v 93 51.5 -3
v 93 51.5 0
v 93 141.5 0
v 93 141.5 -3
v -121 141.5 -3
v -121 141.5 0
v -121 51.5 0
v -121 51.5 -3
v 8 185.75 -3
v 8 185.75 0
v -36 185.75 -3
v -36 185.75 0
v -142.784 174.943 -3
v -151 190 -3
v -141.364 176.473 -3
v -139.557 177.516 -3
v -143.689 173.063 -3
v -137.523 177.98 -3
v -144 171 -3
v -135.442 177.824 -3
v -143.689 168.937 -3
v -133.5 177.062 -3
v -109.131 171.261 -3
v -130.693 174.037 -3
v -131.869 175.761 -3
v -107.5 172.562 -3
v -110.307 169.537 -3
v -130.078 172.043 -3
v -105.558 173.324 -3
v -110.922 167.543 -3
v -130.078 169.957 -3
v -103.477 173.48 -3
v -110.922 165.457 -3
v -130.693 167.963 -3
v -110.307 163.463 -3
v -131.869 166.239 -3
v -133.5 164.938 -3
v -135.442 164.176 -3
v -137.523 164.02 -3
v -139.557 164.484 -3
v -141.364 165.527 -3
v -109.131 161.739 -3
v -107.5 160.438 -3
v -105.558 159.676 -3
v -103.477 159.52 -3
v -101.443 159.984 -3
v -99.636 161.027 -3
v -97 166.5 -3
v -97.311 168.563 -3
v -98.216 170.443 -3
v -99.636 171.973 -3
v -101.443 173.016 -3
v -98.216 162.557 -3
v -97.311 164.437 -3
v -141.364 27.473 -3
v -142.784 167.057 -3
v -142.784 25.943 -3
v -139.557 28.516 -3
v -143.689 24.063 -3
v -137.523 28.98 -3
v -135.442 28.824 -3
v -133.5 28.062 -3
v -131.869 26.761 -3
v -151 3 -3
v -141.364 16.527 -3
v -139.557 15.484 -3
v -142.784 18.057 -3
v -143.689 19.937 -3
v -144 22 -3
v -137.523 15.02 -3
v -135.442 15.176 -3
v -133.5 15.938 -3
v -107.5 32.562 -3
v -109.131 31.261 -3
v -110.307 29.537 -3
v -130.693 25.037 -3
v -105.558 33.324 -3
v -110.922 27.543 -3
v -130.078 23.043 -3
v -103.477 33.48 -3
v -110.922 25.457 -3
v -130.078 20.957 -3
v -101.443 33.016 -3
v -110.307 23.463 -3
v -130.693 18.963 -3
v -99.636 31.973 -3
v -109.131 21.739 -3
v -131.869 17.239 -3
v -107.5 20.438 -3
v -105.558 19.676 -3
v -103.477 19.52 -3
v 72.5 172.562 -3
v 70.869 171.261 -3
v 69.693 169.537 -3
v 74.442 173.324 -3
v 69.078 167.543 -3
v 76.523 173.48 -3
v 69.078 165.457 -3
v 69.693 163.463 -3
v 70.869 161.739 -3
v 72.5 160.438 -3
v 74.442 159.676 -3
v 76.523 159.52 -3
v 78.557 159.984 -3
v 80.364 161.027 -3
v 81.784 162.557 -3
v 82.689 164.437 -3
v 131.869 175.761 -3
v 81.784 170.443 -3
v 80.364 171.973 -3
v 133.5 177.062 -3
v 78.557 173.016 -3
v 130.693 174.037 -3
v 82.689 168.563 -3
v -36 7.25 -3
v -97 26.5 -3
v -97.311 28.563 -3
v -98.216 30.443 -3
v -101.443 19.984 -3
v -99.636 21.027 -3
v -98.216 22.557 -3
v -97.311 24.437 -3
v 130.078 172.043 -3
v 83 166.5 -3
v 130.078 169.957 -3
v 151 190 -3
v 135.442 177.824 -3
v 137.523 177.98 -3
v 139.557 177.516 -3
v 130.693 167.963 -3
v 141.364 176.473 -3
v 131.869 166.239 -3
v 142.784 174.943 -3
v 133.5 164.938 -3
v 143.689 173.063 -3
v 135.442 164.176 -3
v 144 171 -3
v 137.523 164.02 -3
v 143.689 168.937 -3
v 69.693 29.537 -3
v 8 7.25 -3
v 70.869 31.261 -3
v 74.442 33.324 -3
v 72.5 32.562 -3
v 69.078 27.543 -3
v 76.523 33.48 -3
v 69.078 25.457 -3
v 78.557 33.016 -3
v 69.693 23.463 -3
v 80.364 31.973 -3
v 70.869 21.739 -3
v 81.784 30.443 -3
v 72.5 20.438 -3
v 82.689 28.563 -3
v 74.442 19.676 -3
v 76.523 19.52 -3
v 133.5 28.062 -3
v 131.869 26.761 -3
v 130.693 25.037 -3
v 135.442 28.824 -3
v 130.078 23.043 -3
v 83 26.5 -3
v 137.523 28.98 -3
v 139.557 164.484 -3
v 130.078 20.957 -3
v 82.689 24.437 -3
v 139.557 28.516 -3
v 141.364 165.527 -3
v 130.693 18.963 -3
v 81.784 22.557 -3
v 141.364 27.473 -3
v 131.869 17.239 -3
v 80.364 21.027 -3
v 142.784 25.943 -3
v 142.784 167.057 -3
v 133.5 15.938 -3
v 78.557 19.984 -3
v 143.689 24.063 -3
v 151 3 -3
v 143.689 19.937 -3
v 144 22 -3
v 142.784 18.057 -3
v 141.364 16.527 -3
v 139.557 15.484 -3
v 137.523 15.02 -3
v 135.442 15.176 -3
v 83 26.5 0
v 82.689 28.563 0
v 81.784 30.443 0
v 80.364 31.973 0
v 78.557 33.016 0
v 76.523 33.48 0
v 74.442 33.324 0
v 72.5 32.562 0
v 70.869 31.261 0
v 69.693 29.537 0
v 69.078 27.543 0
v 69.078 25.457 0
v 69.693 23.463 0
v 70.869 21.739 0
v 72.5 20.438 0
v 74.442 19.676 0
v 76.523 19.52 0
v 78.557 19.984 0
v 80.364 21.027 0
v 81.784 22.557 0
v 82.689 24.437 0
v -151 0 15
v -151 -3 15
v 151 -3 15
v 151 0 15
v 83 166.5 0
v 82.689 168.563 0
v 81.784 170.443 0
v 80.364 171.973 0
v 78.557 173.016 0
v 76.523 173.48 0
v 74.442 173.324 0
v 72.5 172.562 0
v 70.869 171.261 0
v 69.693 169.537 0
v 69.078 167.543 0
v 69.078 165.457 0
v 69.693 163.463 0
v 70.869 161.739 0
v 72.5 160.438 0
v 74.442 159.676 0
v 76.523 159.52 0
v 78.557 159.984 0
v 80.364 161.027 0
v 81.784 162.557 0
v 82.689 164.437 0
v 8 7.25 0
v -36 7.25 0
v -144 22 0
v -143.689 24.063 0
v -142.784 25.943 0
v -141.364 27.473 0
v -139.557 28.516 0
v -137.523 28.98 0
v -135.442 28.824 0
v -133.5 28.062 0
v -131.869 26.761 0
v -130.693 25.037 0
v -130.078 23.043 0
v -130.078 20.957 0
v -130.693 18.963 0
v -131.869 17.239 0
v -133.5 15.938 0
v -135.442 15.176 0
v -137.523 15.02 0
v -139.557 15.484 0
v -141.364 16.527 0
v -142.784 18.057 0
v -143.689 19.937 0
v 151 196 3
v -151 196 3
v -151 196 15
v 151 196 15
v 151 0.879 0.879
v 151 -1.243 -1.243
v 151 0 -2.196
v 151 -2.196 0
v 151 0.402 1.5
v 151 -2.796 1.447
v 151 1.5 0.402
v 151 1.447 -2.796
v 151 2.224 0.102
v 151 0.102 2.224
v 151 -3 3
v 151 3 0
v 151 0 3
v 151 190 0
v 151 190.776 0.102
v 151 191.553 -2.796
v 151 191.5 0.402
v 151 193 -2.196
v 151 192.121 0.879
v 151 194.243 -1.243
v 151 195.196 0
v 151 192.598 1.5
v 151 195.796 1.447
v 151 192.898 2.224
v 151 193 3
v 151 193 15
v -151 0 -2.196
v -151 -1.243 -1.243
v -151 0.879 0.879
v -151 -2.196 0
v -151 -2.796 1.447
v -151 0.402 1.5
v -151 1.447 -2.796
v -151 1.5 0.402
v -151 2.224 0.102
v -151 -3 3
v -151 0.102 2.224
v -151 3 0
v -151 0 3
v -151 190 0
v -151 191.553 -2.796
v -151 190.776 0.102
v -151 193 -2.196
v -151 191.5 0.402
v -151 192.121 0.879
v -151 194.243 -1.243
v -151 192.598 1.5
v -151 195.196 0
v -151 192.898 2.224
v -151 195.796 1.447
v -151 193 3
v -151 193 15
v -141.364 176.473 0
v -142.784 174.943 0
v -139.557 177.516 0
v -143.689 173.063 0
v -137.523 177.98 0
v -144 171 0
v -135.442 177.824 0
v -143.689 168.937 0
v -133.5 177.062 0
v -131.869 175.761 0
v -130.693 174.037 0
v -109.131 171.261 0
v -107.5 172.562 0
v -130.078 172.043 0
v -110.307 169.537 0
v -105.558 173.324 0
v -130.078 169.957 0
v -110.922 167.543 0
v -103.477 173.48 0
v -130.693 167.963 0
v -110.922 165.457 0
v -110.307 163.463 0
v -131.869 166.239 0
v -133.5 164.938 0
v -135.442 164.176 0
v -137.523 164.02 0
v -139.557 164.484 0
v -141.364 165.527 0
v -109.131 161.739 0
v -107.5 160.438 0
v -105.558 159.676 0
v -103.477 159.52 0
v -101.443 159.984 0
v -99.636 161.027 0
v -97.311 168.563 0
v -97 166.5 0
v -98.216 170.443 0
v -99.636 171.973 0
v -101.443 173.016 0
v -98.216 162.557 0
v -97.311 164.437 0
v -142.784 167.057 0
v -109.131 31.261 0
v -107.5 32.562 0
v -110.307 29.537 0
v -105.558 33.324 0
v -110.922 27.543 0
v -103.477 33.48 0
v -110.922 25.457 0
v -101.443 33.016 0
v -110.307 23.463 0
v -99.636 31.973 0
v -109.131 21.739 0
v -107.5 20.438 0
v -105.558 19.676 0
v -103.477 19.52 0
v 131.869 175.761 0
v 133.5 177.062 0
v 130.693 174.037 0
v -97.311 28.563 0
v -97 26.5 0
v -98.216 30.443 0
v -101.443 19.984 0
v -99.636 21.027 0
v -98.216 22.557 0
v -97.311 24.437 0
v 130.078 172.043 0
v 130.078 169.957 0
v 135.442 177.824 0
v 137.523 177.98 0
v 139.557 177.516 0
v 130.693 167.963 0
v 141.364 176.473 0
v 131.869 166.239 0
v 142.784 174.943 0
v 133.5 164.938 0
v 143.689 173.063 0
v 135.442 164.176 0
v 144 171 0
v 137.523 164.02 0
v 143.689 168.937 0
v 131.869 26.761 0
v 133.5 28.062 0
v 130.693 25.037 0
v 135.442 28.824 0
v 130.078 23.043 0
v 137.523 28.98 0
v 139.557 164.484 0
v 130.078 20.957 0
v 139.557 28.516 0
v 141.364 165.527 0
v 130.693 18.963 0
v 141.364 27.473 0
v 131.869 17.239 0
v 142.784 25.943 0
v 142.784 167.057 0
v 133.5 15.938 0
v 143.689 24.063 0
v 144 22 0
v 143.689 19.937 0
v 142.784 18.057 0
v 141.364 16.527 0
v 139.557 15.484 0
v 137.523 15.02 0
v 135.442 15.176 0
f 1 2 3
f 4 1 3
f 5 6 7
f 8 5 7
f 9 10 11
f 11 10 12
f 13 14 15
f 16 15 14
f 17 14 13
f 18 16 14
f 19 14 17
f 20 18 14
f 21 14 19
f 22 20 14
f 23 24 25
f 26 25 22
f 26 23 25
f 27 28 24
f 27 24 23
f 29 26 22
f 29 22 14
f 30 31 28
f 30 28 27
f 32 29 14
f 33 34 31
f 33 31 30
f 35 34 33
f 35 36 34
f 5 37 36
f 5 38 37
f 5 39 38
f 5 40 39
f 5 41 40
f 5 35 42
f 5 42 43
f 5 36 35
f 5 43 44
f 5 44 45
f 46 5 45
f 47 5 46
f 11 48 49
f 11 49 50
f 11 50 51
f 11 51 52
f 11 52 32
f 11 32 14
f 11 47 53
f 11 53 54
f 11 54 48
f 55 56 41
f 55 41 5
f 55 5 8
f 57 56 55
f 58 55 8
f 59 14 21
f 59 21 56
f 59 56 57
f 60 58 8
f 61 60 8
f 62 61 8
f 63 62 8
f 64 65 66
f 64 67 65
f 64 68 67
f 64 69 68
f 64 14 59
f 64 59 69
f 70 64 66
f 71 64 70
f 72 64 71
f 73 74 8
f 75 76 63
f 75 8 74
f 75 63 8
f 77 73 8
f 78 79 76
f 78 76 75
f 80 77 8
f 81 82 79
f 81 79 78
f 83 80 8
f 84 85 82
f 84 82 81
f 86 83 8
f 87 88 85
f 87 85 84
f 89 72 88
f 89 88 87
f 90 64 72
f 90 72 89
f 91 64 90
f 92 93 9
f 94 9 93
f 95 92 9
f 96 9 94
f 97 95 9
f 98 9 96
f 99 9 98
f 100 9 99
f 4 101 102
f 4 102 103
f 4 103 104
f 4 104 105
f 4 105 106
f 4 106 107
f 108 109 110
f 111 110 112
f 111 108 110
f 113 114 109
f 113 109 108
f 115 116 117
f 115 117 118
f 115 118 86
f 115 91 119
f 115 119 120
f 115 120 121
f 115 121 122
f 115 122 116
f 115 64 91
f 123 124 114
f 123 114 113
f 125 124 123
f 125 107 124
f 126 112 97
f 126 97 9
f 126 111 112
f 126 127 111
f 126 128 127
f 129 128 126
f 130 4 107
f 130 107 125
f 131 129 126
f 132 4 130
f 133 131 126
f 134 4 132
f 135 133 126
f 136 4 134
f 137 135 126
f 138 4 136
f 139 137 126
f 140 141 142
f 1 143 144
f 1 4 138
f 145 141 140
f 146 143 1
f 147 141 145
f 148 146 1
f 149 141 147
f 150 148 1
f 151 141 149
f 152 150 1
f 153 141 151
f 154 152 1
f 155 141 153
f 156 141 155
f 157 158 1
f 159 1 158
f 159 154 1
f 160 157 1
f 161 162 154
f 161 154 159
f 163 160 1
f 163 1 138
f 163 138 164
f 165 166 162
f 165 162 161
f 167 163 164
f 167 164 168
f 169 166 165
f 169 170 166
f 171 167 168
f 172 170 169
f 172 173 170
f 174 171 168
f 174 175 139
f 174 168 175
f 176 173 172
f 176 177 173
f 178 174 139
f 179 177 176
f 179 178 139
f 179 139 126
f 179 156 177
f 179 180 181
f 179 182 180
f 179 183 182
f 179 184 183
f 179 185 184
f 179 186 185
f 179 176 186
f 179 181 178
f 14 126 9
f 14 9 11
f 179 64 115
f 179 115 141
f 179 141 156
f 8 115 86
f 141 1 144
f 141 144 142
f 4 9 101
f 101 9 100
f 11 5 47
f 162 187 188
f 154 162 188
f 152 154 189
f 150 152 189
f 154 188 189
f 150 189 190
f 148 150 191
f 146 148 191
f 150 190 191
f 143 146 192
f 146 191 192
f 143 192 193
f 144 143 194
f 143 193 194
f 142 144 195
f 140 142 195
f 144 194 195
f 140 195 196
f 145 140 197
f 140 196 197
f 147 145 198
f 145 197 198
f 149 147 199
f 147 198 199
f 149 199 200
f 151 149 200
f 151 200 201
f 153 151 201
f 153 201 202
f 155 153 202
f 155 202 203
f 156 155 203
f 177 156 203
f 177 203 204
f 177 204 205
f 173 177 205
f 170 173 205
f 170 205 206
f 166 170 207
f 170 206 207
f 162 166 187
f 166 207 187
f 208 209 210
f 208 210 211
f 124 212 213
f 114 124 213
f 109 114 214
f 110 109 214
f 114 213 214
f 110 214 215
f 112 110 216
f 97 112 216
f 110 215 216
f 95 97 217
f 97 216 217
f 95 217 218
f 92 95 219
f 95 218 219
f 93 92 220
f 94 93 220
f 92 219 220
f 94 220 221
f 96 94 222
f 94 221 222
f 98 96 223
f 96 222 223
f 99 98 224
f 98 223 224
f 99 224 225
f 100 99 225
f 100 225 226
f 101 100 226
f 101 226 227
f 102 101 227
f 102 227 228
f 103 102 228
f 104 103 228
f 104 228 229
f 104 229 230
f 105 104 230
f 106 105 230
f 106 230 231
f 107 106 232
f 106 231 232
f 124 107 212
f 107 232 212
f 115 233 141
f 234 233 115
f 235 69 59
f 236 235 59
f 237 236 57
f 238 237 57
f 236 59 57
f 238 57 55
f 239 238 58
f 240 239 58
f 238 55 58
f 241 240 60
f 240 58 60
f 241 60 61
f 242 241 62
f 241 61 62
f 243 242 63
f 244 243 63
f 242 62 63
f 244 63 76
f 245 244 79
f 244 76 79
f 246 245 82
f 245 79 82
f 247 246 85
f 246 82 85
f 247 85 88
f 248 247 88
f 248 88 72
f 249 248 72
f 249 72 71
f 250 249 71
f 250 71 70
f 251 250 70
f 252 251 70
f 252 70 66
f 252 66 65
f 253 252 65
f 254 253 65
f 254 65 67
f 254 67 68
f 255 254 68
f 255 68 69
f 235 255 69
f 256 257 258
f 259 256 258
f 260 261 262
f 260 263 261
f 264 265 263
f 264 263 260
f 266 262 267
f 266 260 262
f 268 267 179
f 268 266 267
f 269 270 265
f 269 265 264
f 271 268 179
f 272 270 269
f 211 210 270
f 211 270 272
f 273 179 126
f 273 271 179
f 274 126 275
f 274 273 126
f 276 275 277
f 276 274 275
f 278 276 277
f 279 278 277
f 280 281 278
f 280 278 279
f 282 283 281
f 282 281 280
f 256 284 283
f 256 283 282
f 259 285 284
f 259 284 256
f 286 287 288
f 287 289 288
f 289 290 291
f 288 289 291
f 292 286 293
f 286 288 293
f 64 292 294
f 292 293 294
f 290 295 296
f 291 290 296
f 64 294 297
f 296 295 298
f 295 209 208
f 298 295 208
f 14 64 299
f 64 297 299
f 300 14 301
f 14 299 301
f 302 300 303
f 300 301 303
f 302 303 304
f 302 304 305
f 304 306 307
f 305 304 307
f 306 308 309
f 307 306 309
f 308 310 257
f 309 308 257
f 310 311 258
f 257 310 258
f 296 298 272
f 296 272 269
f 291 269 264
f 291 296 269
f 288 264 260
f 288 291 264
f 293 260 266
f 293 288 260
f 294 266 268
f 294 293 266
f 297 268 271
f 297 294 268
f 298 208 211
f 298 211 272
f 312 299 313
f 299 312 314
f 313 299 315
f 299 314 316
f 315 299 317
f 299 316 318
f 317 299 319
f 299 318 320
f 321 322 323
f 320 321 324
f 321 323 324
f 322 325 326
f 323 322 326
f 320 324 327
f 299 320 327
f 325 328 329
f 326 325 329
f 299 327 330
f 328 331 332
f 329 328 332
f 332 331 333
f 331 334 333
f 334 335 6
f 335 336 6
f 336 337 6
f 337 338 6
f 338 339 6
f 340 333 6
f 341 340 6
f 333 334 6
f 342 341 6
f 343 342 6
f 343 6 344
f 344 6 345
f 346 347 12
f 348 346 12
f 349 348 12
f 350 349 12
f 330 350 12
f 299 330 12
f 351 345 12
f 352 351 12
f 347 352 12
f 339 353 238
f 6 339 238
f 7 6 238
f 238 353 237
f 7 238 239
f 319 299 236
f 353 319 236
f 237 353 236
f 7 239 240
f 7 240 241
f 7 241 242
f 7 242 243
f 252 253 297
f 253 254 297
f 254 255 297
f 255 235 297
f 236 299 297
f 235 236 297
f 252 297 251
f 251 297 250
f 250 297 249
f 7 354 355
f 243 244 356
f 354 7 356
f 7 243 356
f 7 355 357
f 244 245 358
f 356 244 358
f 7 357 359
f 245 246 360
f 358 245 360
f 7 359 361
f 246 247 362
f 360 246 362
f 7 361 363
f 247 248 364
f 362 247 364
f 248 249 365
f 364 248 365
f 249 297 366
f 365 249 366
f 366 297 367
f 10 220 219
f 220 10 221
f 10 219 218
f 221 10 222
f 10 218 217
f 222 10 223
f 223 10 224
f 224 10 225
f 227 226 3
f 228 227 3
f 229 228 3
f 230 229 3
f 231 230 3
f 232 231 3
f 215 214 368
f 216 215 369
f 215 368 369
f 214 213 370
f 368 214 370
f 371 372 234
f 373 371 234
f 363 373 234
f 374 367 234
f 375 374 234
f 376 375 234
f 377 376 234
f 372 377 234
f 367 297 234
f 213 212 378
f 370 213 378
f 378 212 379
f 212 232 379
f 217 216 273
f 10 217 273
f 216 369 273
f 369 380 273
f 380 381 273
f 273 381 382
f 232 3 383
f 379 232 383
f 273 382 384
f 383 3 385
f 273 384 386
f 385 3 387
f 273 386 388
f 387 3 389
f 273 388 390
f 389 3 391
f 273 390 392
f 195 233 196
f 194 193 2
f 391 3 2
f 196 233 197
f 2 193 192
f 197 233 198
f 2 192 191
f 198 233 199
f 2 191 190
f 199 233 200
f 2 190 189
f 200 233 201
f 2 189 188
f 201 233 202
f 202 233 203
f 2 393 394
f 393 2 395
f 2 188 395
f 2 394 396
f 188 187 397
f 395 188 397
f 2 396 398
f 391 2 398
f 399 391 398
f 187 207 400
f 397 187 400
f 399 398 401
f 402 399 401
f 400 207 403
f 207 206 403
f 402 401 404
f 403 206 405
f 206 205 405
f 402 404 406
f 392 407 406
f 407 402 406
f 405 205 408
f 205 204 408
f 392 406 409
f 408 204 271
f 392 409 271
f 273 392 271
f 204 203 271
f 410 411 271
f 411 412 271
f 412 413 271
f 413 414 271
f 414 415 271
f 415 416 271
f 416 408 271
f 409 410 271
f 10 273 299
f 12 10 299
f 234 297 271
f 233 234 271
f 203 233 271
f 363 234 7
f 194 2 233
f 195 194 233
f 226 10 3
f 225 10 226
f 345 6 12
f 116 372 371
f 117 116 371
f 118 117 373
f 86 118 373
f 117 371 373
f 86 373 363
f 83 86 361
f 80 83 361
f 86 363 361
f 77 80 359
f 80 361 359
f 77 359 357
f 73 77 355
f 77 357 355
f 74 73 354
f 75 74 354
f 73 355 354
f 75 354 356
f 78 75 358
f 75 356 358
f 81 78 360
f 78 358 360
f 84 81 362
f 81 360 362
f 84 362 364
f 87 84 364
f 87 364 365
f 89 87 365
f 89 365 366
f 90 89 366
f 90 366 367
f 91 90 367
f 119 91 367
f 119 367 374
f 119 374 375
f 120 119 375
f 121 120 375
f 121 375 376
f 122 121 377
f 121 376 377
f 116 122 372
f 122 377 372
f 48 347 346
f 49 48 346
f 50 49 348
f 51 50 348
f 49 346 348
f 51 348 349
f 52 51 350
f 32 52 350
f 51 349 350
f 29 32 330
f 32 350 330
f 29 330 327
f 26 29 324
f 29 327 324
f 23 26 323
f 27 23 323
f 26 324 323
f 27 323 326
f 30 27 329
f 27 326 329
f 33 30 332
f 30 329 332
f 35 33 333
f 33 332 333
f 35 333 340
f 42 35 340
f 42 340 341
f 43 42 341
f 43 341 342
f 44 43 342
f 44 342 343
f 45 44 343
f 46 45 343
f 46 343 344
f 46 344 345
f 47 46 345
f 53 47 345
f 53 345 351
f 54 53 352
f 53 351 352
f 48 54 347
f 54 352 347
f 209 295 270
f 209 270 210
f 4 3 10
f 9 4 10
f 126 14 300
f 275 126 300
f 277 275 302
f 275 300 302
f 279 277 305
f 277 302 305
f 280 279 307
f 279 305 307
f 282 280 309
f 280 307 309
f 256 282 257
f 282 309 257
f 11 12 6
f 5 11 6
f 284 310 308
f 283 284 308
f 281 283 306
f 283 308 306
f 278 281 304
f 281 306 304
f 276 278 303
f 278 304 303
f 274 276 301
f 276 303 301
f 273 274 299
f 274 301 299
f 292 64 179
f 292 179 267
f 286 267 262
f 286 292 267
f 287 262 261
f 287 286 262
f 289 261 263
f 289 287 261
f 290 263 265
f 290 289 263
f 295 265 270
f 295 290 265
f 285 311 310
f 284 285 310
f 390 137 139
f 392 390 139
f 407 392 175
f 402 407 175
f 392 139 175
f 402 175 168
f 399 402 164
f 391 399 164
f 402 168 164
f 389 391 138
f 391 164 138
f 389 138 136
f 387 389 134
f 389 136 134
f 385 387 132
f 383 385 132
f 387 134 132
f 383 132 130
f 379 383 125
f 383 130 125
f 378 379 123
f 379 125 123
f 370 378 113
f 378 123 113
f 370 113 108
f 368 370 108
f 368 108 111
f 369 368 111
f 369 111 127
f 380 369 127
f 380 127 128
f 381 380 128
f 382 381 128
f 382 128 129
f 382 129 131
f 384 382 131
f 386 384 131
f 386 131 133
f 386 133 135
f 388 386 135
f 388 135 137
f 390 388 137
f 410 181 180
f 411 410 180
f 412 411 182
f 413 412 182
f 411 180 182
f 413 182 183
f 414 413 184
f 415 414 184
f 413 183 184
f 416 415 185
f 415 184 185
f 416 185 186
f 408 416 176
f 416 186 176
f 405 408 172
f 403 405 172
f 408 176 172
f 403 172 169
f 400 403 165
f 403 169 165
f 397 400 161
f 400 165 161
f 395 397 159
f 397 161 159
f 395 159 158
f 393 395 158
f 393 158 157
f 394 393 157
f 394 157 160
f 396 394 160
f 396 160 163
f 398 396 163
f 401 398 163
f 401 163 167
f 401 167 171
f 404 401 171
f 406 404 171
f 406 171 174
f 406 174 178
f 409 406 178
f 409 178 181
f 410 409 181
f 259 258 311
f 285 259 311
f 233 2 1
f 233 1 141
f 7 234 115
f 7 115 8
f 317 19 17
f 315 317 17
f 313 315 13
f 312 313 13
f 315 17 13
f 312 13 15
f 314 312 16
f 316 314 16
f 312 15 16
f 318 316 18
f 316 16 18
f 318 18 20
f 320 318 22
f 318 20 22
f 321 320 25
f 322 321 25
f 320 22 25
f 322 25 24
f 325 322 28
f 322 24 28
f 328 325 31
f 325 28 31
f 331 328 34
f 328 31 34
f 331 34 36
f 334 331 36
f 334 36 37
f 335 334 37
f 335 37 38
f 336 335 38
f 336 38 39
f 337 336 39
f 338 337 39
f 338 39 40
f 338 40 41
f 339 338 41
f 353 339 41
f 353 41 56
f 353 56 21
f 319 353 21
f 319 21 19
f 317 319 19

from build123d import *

# Parameters (mm, degrees)
SM_BASE_FLANGE_1_DEPTH           = 3
SM_EDGE_FLANGE_1_STRIP_W         = 18
SM_EDGE_FLANGE_1_STRIP_H         = 3
SM_EDGE_FLANGE_1_STRIP_CUT_DEPTH = 302
SM_EDGE_FLANGE_1_DEPTH           = 302
SKETCH_9_R                       = 7
CUT_EXTRUDE_1_DEPTH              = 10
SKETCH_10_R                      = 7
CUT_EXTRUDE_2_DEPTH              = 3


# Sheet-metal steps are written as plain solids
with BuildPart() as part:
    # Sketch 1 → Базовая кромка1 (new body)
    with BuildSketch(Plane.XY):
        Polygon((-151, 0), (151, 0), (151, 96.5), (93, 96.5), (93, 51.5), (8, 7.25), (-36, 7.25), (-121, 51.5), (-121, 96.5), (-151, 96.5), align=None)
    extrude(amount=-SM_BASE_FLANGE_1_DEPTH)

    # Ребро-кромка1 strip (across the edge) → Ребро-кромка1 strip cut (cut)
    with BuildSketch(Plane.YZ.offset(-151)):
        with Locations((-6, -1.5)):
            Rectangle(SM_EDGE_FLANGE_1_STRIP_W, SM_EDGE_FLANGE_1_STRIP_H)
    extrude(amount=SM_EDGE_FLANGE_1_STRIP_CUT_DEPTH, mode=Mode.SUBTRACT)

    # Ребро-кромка1 section (across the edge) → Ребро-кромка1 (add)
    with BuildSketch(Plane.YZ.offset(-151)):
        with BuildLine():
            Line((-3, 3), (-3, 15))
            Line((-3, 15), (0, 15))
            Line((0, 15), (0, 3))
            ThreePointArc((0, 3), (0.878679656, 0.878679656), (3, 0))
            Line((3, 0), (3, -3))
            ThreePointArc((3, -3), (-1.242640687, -1.242640687), (-3, 3))
        make_face()
    extrude(amount=SM_EDGE_FLANGE_1_DEPTH)

    # Зеркальное отражение1: part across plane


with BuildPart() as part_1:
    add(part.part)
    add(part.part.mirror(Plane(origin=(-151, 96.5, -3), x_dir=(0, 0, 1), z_dir=(0, 1, 0))))

    # Эскиз9 → Вырез-Вытянуть1 (cut)
    with BuildSketch(Plane(origin=(0, 0, -3), x_dir=(-1, 0, 0), z_dir=(0, 0, -1))):
        with Locations((137, 171)):
            Circle(SKETCH_9_R)
        with Locations((137, 22)):
            Circle(SKETCH_9_R)
        with Locations(Location((-137, 22, 0), (0, 0, 180))):
            Circle(SKETCH_9_R)
        with Locations(Location((-137, 171, 0), (0, 0, 180))):
            Circle(SKETCH_9_R)
    extrude(amount=-CUT_EXTRUDE_1_DEPTH, mode=Mode.SUBTRACT)

    # Эскиз10 → Вырез-Вытянуть2 (cut)
    with BuildSketch(Plane.XY):
        with Locations((76, 166.5)):
            Circle(SKETCH_10_R)
        with Locations((-104, 166.5)):
            Circle(SKETCH_10_R)
        with Locations((-104, 26.5)):
            Circle(SKETCH_10_R)
        with Locations((76, 26.5)):
            Circle(SKETCH_10_R)
    extrude(amount=-CUT_EXTRUDE_2_DEPTH, mode=Mode.SUBTRACT)


solid = part_1.part
